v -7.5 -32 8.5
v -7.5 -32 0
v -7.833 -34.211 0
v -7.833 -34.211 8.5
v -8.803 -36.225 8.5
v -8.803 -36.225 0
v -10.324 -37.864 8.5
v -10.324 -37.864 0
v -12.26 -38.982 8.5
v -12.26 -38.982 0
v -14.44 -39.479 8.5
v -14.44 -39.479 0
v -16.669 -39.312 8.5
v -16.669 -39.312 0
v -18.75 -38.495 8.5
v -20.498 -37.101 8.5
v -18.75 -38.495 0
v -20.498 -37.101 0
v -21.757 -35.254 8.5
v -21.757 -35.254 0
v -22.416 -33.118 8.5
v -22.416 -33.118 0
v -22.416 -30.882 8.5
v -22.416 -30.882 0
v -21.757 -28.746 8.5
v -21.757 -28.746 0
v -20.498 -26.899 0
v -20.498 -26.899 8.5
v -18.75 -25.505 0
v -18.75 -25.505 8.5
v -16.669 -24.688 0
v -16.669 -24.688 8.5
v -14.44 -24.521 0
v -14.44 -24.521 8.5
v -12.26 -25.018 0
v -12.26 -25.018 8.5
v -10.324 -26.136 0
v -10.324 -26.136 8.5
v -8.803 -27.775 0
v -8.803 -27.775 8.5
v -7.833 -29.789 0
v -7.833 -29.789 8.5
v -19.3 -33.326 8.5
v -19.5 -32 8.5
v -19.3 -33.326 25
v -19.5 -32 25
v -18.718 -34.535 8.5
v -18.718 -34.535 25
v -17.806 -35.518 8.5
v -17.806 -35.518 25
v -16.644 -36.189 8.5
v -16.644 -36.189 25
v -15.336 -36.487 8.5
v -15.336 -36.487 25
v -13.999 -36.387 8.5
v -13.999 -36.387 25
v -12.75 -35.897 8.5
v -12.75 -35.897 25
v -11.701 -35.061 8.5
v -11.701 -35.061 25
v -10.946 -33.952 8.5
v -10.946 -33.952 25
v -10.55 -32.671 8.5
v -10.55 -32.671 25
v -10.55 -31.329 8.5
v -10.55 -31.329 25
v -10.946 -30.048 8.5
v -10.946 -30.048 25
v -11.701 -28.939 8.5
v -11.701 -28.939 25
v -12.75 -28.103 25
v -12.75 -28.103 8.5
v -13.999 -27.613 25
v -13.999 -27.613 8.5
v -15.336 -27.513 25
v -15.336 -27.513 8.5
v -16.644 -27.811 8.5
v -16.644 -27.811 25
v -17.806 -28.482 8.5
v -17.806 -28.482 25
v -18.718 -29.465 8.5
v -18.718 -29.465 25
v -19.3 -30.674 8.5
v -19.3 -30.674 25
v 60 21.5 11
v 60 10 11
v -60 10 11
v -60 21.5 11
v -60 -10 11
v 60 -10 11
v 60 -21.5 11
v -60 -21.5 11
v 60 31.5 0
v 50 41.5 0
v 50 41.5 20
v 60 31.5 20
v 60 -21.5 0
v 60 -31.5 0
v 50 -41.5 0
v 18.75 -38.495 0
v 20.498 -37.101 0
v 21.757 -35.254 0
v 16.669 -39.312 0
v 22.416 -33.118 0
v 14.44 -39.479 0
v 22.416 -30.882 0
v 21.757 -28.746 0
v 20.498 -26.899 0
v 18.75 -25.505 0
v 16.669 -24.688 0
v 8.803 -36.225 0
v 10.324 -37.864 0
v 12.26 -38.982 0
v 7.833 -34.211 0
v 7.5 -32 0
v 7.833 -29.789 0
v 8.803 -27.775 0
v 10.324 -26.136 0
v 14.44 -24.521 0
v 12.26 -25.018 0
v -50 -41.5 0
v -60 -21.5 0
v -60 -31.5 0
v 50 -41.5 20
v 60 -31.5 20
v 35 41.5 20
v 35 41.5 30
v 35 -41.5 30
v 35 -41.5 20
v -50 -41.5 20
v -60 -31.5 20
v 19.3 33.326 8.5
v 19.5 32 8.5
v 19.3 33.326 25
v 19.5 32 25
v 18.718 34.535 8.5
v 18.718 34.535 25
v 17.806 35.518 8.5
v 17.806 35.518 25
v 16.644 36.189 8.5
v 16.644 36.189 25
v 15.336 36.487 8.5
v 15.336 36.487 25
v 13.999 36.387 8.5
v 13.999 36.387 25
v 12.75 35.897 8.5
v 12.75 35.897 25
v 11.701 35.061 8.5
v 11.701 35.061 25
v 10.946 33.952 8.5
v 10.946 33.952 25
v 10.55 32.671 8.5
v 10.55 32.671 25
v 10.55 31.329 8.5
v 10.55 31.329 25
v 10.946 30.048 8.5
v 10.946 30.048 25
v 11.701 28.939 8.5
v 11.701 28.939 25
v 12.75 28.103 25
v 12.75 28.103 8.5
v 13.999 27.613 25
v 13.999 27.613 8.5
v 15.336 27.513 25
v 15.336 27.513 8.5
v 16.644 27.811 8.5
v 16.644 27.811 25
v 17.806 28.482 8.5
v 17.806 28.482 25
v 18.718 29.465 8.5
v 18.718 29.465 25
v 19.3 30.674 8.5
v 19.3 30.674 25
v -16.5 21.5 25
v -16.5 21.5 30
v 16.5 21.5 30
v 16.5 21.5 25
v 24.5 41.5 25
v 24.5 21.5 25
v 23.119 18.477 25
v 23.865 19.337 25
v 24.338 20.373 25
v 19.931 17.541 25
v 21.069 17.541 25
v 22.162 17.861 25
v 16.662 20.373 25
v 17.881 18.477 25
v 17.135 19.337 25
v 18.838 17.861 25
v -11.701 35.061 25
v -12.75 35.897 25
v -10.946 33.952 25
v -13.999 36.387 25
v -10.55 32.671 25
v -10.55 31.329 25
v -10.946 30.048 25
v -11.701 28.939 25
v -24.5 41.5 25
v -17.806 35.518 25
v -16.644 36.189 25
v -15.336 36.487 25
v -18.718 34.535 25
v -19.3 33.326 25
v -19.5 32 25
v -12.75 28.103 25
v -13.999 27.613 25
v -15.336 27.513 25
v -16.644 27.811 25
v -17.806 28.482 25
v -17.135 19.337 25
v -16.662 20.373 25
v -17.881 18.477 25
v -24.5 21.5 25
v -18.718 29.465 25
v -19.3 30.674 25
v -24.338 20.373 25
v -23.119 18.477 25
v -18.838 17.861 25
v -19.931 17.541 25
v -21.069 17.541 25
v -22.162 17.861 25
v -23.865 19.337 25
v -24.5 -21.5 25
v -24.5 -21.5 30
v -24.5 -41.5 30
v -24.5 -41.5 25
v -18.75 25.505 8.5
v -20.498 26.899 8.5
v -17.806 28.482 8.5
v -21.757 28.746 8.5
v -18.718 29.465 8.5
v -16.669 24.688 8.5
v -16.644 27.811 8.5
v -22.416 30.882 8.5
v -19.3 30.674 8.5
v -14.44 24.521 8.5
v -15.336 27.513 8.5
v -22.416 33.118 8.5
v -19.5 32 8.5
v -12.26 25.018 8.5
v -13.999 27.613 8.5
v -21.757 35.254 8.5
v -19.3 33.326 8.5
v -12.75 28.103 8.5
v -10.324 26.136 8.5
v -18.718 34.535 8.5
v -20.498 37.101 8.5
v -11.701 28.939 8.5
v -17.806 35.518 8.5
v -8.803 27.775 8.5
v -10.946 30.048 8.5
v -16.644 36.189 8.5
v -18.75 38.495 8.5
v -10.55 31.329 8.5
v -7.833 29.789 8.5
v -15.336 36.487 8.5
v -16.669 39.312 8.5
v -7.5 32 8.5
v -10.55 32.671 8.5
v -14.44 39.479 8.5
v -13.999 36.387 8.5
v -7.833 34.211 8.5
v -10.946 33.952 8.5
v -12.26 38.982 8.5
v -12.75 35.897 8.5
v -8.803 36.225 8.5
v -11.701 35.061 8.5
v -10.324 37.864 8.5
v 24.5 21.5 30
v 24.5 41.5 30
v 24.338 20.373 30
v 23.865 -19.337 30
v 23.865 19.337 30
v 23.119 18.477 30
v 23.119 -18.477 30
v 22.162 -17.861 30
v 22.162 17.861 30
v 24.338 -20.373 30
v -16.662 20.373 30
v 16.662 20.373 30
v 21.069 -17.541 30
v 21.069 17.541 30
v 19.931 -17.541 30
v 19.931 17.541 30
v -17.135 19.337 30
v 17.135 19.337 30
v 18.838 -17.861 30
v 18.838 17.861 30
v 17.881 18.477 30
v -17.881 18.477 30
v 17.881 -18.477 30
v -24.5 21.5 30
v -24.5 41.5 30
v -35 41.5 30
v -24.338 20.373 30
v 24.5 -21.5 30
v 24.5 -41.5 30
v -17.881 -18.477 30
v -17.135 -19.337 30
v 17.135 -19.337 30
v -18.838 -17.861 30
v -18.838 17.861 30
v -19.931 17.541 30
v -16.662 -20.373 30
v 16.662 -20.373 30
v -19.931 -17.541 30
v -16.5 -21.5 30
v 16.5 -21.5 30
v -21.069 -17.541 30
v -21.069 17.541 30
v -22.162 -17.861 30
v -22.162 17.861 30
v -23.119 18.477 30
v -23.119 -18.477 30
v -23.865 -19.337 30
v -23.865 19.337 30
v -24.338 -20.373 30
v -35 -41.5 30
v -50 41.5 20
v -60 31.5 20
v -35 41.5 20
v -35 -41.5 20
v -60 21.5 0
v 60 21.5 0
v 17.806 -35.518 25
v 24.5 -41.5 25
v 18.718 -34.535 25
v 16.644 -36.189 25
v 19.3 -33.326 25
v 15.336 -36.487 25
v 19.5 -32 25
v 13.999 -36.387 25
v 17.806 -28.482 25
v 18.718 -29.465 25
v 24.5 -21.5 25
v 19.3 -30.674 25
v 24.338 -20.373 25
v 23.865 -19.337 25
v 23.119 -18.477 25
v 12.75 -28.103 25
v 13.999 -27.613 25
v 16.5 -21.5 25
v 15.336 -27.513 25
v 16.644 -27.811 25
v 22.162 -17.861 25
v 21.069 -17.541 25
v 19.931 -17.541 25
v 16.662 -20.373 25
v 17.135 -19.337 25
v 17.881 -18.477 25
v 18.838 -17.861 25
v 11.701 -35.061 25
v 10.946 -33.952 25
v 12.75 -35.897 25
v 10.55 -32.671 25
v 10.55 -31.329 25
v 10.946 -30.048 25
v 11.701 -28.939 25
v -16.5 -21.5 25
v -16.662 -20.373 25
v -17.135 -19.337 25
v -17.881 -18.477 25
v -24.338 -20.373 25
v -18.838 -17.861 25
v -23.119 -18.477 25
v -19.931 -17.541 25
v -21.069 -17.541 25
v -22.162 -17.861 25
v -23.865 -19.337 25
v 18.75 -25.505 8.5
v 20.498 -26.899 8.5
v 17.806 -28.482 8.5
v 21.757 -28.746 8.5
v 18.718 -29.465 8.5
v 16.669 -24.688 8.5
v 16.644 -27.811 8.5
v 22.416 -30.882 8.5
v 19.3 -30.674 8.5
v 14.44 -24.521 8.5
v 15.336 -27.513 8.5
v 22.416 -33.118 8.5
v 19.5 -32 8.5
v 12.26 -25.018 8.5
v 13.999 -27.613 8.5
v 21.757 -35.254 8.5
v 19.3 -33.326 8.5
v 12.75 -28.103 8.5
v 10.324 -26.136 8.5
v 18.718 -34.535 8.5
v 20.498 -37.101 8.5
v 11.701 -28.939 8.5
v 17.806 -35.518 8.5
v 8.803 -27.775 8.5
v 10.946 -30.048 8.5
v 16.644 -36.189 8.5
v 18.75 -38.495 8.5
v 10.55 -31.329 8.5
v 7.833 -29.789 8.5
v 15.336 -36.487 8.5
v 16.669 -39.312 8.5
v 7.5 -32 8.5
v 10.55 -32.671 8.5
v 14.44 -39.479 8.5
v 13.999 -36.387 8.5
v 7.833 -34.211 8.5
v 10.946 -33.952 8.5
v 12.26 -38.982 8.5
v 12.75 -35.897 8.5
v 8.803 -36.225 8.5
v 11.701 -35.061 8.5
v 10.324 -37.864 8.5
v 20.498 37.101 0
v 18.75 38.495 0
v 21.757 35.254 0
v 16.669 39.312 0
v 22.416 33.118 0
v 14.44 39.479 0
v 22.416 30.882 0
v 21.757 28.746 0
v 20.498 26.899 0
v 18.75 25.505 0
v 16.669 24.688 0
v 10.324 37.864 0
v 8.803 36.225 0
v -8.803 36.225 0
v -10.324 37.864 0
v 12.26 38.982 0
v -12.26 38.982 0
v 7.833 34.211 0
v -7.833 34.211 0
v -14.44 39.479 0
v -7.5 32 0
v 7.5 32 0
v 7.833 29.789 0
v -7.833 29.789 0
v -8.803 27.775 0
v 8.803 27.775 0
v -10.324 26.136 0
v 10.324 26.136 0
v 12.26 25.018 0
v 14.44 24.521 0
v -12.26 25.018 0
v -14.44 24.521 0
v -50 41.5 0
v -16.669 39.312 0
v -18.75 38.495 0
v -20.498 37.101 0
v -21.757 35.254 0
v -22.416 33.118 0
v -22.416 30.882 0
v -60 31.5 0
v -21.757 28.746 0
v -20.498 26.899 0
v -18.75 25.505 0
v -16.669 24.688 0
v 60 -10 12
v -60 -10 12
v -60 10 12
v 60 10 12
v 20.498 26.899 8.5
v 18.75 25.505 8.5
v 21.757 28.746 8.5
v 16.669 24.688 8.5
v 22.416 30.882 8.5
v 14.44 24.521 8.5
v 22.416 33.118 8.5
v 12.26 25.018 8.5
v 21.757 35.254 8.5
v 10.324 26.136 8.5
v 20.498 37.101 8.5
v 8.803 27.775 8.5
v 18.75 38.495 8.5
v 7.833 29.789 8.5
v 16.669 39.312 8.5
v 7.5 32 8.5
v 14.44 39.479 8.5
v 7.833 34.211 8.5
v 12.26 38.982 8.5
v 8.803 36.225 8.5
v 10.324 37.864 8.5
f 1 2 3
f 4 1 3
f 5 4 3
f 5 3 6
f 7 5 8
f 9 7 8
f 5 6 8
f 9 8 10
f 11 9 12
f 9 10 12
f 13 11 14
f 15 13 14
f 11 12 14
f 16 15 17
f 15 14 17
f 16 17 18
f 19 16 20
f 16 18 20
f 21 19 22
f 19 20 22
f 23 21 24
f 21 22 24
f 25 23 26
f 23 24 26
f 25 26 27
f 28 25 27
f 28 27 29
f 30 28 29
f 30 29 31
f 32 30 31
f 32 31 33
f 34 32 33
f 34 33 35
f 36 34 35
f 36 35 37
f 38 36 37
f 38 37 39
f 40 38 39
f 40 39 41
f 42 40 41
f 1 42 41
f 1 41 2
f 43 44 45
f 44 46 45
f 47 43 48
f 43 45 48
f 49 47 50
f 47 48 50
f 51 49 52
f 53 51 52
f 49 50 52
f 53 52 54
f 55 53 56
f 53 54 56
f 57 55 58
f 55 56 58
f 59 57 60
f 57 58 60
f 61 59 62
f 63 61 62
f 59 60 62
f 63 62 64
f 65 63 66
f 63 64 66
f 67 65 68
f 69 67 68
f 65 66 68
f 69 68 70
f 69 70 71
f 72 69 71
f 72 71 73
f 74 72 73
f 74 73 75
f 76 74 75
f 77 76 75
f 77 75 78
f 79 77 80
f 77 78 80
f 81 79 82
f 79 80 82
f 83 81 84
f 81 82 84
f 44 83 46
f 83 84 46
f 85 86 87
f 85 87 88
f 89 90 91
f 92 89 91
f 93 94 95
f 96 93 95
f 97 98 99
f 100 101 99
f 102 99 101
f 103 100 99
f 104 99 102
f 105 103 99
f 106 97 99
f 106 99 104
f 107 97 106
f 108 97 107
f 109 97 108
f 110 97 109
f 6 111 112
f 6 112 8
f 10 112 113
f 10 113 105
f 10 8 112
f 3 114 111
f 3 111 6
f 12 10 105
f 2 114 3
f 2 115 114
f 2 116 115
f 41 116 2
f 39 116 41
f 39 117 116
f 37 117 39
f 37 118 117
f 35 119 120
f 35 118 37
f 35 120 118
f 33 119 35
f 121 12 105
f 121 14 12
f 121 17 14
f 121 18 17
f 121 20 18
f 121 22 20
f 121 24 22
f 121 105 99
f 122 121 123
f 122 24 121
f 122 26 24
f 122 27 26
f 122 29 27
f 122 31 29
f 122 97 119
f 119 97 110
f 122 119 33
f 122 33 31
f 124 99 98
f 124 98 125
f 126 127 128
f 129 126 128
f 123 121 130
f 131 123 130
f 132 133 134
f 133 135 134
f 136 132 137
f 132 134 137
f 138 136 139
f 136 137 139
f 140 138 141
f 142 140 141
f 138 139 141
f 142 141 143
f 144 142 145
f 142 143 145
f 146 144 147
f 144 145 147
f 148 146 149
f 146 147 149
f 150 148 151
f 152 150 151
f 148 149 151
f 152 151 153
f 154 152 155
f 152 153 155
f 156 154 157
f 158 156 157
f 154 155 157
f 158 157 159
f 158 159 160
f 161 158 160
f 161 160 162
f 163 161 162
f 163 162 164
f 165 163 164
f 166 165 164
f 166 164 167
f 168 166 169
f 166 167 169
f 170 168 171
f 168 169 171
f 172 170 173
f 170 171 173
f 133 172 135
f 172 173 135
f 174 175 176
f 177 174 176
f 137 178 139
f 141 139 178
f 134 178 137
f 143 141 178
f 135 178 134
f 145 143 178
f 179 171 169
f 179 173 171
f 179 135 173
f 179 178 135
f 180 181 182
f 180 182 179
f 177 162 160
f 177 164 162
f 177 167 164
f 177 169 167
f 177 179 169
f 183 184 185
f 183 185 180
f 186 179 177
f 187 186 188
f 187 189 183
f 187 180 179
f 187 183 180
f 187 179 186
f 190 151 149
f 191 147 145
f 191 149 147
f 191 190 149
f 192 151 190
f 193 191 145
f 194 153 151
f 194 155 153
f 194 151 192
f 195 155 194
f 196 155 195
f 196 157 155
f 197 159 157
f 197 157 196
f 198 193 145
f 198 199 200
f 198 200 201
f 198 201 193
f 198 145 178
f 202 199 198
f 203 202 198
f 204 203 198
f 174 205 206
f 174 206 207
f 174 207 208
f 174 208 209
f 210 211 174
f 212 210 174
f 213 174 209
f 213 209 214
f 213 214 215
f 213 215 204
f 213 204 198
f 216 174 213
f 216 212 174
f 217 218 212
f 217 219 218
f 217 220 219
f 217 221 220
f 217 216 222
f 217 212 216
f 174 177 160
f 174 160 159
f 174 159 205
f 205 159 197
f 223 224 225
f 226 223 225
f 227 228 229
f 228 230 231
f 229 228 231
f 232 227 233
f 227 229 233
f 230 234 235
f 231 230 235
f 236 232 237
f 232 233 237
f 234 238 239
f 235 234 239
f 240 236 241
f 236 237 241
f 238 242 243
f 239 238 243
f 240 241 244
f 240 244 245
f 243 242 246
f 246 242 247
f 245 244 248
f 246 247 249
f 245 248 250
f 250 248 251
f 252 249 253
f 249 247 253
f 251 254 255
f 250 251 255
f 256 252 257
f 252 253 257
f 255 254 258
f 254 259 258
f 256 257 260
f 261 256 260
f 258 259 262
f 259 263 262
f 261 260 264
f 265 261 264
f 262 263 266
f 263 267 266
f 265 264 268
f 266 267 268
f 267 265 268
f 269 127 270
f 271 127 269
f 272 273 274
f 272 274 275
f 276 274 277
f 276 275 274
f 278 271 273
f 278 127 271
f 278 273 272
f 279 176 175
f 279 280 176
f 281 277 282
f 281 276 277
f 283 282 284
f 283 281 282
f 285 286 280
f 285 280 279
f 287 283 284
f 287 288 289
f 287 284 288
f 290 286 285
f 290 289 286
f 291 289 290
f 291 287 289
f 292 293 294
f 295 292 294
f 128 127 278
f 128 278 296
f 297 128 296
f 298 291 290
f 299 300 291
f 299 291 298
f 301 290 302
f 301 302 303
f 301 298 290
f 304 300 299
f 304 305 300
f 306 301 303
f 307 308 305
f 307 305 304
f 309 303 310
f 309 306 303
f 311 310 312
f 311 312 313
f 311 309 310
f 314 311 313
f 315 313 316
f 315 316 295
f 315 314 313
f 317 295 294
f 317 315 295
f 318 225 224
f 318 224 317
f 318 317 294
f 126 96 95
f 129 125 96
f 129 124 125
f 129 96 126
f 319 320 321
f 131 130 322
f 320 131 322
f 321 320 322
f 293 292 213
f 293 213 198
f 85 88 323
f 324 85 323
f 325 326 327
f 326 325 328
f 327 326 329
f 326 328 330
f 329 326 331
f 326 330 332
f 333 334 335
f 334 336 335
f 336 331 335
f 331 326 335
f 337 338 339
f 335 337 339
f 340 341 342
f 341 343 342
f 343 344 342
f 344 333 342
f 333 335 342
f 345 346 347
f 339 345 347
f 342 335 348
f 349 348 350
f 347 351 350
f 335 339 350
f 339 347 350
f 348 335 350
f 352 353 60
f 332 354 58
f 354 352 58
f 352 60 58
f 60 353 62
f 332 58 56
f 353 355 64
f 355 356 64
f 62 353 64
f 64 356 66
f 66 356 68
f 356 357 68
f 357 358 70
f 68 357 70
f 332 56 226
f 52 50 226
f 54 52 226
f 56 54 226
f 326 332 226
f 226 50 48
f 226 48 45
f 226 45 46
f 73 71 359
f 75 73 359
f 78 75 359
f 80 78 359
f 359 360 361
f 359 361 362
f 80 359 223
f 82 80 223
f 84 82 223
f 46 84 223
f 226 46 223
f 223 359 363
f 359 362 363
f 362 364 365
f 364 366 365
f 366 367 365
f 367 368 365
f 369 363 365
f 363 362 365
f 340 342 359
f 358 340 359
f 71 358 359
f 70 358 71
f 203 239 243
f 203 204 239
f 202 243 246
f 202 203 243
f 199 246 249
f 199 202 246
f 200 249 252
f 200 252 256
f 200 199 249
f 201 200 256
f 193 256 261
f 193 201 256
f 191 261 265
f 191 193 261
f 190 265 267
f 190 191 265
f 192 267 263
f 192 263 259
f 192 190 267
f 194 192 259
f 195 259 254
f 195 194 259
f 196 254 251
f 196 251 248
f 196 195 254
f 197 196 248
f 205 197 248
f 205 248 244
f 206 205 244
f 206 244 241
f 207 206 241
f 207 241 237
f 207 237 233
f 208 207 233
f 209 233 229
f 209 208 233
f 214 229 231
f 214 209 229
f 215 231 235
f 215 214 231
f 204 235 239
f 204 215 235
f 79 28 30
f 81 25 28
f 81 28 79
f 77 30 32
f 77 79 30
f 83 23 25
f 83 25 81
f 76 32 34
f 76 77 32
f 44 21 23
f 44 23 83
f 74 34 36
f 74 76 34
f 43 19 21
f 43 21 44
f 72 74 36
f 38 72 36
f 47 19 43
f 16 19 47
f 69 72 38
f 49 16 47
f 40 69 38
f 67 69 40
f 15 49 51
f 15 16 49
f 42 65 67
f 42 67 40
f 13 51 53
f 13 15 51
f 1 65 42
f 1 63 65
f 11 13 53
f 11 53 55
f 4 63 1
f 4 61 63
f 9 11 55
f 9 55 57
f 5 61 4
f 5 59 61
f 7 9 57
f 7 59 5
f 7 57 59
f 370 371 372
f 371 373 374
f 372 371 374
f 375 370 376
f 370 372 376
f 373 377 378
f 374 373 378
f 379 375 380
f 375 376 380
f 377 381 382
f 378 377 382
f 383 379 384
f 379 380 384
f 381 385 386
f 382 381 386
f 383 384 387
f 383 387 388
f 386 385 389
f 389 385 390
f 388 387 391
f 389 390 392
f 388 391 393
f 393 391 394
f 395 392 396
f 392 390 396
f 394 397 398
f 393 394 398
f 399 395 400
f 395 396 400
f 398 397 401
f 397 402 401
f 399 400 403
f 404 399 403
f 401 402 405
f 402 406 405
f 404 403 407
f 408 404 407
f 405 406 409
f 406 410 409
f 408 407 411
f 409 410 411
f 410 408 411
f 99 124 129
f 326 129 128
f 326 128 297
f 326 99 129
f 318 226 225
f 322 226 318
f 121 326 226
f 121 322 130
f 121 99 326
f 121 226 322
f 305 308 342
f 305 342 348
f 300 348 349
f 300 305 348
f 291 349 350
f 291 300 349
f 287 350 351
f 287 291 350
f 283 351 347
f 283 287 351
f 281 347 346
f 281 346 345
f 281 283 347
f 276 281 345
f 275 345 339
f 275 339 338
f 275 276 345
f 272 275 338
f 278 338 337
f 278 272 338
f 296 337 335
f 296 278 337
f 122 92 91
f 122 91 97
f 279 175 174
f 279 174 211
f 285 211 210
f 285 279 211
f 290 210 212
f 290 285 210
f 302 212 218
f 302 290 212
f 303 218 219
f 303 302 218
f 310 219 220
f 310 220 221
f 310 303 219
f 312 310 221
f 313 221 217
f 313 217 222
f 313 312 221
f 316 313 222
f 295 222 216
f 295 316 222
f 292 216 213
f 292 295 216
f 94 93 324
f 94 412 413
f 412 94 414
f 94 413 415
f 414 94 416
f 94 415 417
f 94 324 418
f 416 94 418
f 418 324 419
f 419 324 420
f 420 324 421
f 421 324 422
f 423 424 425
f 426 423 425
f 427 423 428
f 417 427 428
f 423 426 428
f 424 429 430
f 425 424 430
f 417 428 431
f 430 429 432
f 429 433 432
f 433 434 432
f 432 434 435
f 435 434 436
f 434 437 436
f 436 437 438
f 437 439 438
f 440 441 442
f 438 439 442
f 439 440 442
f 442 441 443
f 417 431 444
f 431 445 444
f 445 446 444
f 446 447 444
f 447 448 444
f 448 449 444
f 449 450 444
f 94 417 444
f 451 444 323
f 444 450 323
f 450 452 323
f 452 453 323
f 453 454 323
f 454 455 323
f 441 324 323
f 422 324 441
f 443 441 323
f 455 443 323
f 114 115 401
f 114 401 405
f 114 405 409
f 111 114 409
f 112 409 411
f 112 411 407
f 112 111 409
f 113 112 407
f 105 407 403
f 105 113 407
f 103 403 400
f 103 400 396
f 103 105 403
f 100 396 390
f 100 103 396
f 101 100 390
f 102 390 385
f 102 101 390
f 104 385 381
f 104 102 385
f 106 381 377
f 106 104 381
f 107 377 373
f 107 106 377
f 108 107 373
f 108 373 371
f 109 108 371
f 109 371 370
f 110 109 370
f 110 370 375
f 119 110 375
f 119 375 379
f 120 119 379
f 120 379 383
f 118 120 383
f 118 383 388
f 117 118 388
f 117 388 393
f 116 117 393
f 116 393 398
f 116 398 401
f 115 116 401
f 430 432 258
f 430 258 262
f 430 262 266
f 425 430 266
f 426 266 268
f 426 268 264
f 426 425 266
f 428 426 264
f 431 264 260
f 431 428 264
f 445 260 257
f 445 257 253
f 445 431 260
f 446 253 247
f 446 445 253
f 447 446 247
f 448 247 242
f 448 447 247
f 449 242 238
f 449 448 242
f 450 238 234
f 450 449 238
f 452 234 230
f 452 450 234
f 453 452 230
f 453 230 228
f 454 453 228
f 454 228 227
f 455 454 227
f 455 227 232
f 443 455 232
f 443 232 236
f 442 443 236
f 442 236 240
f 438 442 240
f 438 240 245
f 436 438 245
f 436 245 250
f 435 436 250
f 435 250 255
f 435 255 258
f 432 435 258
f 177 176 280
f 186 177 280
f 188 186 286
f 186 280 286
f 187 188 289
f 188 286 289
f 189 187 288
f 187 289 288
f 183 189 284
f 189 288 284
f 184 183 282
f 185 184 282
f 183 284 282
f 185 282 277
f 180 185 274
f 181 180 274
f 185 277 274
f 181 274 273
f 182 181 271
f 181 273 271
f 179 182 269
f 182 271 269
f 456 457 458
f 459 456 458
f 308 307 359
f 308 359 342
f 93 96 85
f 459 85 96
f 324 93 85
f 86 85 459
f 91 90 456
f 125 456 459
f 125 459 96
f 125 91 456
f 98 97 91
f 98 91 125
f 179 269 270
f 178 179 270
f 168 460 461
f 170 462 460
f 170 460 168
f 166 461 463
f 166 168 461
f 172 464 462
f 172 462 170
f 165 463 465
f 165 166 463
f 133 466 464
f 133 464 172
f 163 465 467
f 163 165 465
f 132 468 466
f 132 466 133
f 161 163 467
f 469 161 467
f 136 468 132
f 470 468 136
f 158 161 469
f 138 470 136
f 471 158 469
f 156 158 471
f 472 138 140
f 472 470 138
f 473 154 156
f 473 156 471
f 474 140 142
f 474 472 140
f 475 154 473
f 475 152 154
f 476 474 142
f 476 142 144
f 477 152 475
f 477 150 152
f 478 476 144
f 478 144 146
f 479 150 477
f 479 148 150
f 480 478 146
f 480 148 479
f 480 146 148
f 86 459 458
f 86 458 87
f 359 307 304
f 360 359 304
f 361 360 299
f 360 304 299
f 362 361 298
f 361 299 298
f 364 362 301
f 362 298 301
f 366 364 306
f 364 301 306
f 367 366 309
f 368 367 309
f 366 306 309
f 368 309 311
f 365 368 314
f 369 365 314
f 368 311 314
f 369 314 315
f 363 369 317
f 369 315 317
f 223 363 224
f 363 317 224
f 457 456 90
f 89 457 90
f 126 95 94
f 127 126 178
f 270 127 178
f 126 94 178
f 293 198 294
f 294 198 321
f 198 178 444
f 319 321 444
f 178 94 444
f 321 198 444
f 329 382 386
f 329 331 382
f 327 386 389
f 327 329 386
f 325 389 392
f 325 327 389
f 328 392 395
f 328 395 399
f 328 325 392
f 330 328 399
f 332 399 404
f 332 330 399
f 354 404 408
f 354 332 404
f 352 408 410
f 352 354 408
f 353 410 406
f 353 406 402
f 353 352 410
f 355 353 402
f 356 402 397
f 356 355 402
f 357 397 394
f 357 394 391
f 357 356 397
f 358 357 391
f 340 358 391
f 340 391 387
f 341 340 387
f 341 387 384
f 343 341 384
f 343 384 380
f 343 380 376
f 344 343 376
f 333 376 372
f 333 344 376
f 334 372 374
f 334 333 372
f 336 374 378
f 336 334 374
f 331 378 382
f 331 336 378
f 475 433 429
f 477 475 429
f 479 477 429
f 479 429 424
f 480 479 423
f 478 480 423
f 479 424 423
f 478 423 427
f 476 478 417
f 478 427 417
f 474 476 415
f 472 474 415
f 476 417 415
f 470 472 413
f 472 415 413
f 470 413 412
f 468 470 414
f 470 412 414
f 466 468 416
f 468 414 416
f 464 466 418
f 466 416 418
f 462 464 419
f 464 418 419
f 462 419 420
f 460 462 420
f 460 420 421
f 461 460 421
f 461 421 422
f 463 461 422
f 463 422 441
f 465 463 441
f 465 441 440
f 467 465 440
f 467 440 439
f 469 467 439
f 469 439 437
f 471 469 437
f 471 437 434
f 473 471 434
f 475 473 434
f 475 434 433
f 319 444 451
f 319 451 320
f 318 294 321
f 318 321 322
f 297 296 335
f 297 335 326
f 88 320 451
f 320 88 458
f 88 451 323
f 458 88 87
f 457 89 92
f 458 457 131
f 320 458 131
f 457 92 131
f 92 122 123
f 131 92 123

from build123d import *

# Parameters (mm, degrees)
F0_W            = 25
F0_H            = 41.5
F1_DEPTH        = 30
F2_W            = 25
F2_H            = 41.5
F3_DEPTH        = 10
F4_SIZE         = 10
F6_DEPTH        = 5
F8_DEPTH        = 60.001
F10_D           = 9
F10_CBORE_D     = 15
F10_CBORE_DEPTH = 8.5


with BuildPart() as f1:
    # F0 (on Top) → F1 (new body)
    with BuildSketch(Plane.XY):
        with BuildLine():
            Line((0, -21.5), (0, 0))
            Line((0, 0), (-35, 0))
            Line((-35, 0), (-35, -41.5))
            Line((-35, -41.5), (-24.5, -41.5))
            Line((-24.5, -41.5), (-24.5, -21.5))
            ThreePointArc((-24.5, -21.5), (-20.5, -17.5), (-16.5, -21.5))
            Line((-16.5, -21.5), (0, -21.5))
        make_face()
        with Locations((-47.5, -20.75)):
            Rectangle(F0_W, F0_H)
        with BuildLine():
            Line((0, -41.5), (0, -21.5))
            Line((0, -21.5), (-16.5, -21.5))
            ThreePointArc((-16.5, -21.5), (-20.5, -17.5), (-24.5, -21.5))
            Line((-24.5, -21.5), (-24.5, -41.5))
            Line((-24.5, -41.5), (0, -41.5))
        make_face()
    extrude(amount=F1_DEPTH)

    # F2 (on face) → F3 (cut)
    with BuildSketch(Plane.XY.offset(30)):
        with Locations((-47.5, -20.75)):
            Rectangle(F2_W, F2_H)
    extrude(amount=-F3_DEPTH, mode=Mode.SUBTRACT)

    # F4
    f4_edges = [f1.edges().sort_by_distance(p)[0] for p in [
        (-60, -41.5, 10),
    ]]
    chamfer(f4_edges, length=F4_SIZE)

    # F5 (on face) → F6 (cut)
    with BuildSketch(Plane.XY.offset(30)):
        with BuildLine():
            Line((0, -21.5), (-16.5, -21.5))
            ThreePointArc((-16.5, -21.5), (-20.5, -17.5), (-24.5, -21.5))
            Line((-24.5, -21.5), (-24.5, -41.5))
            Line((-24.5, -41.5), (0, -41.5))
            Line((0, -41.5), (0, -21.5))
        make_face()
    extrude(amount=-F6_DEPTH, mode=Mode.SUBTRACT)

    # F7 (on Right) → F8 (cut, through all)
    with BuildSketch(Plane.YZ):
        Polygon((0, 0), (0, 12), (-10, 12), (-10, 11), (-21.5, 11), (-21.5, 0), align=None)
    extrude(amount=-F8_DEPTH, mode=Mode.SUBTRACT)

    # F10 (through all)
    with Locations(Plane(origin=(0, 0, 0), x_dir=(1, 0, 0), z_dir=(0, 0, -1))):
        with Locations((-15, 32)):
            CounterBoreHole(F10_D / 2, F10_CBORE_D / 2, F10_CBORE_DEPTH)

    # F11: F1 across plane


with BuildPart() as f1_1:
    add(f1.part)
    add(f1.part.mirror(Plane.YZ))

    # F12: F1 across plane


with BuildPart() as f1_2:
    add(f1_1.part)
    add(f1_1.part.mirror(Plane.XZ))


solid = f1_2.part
